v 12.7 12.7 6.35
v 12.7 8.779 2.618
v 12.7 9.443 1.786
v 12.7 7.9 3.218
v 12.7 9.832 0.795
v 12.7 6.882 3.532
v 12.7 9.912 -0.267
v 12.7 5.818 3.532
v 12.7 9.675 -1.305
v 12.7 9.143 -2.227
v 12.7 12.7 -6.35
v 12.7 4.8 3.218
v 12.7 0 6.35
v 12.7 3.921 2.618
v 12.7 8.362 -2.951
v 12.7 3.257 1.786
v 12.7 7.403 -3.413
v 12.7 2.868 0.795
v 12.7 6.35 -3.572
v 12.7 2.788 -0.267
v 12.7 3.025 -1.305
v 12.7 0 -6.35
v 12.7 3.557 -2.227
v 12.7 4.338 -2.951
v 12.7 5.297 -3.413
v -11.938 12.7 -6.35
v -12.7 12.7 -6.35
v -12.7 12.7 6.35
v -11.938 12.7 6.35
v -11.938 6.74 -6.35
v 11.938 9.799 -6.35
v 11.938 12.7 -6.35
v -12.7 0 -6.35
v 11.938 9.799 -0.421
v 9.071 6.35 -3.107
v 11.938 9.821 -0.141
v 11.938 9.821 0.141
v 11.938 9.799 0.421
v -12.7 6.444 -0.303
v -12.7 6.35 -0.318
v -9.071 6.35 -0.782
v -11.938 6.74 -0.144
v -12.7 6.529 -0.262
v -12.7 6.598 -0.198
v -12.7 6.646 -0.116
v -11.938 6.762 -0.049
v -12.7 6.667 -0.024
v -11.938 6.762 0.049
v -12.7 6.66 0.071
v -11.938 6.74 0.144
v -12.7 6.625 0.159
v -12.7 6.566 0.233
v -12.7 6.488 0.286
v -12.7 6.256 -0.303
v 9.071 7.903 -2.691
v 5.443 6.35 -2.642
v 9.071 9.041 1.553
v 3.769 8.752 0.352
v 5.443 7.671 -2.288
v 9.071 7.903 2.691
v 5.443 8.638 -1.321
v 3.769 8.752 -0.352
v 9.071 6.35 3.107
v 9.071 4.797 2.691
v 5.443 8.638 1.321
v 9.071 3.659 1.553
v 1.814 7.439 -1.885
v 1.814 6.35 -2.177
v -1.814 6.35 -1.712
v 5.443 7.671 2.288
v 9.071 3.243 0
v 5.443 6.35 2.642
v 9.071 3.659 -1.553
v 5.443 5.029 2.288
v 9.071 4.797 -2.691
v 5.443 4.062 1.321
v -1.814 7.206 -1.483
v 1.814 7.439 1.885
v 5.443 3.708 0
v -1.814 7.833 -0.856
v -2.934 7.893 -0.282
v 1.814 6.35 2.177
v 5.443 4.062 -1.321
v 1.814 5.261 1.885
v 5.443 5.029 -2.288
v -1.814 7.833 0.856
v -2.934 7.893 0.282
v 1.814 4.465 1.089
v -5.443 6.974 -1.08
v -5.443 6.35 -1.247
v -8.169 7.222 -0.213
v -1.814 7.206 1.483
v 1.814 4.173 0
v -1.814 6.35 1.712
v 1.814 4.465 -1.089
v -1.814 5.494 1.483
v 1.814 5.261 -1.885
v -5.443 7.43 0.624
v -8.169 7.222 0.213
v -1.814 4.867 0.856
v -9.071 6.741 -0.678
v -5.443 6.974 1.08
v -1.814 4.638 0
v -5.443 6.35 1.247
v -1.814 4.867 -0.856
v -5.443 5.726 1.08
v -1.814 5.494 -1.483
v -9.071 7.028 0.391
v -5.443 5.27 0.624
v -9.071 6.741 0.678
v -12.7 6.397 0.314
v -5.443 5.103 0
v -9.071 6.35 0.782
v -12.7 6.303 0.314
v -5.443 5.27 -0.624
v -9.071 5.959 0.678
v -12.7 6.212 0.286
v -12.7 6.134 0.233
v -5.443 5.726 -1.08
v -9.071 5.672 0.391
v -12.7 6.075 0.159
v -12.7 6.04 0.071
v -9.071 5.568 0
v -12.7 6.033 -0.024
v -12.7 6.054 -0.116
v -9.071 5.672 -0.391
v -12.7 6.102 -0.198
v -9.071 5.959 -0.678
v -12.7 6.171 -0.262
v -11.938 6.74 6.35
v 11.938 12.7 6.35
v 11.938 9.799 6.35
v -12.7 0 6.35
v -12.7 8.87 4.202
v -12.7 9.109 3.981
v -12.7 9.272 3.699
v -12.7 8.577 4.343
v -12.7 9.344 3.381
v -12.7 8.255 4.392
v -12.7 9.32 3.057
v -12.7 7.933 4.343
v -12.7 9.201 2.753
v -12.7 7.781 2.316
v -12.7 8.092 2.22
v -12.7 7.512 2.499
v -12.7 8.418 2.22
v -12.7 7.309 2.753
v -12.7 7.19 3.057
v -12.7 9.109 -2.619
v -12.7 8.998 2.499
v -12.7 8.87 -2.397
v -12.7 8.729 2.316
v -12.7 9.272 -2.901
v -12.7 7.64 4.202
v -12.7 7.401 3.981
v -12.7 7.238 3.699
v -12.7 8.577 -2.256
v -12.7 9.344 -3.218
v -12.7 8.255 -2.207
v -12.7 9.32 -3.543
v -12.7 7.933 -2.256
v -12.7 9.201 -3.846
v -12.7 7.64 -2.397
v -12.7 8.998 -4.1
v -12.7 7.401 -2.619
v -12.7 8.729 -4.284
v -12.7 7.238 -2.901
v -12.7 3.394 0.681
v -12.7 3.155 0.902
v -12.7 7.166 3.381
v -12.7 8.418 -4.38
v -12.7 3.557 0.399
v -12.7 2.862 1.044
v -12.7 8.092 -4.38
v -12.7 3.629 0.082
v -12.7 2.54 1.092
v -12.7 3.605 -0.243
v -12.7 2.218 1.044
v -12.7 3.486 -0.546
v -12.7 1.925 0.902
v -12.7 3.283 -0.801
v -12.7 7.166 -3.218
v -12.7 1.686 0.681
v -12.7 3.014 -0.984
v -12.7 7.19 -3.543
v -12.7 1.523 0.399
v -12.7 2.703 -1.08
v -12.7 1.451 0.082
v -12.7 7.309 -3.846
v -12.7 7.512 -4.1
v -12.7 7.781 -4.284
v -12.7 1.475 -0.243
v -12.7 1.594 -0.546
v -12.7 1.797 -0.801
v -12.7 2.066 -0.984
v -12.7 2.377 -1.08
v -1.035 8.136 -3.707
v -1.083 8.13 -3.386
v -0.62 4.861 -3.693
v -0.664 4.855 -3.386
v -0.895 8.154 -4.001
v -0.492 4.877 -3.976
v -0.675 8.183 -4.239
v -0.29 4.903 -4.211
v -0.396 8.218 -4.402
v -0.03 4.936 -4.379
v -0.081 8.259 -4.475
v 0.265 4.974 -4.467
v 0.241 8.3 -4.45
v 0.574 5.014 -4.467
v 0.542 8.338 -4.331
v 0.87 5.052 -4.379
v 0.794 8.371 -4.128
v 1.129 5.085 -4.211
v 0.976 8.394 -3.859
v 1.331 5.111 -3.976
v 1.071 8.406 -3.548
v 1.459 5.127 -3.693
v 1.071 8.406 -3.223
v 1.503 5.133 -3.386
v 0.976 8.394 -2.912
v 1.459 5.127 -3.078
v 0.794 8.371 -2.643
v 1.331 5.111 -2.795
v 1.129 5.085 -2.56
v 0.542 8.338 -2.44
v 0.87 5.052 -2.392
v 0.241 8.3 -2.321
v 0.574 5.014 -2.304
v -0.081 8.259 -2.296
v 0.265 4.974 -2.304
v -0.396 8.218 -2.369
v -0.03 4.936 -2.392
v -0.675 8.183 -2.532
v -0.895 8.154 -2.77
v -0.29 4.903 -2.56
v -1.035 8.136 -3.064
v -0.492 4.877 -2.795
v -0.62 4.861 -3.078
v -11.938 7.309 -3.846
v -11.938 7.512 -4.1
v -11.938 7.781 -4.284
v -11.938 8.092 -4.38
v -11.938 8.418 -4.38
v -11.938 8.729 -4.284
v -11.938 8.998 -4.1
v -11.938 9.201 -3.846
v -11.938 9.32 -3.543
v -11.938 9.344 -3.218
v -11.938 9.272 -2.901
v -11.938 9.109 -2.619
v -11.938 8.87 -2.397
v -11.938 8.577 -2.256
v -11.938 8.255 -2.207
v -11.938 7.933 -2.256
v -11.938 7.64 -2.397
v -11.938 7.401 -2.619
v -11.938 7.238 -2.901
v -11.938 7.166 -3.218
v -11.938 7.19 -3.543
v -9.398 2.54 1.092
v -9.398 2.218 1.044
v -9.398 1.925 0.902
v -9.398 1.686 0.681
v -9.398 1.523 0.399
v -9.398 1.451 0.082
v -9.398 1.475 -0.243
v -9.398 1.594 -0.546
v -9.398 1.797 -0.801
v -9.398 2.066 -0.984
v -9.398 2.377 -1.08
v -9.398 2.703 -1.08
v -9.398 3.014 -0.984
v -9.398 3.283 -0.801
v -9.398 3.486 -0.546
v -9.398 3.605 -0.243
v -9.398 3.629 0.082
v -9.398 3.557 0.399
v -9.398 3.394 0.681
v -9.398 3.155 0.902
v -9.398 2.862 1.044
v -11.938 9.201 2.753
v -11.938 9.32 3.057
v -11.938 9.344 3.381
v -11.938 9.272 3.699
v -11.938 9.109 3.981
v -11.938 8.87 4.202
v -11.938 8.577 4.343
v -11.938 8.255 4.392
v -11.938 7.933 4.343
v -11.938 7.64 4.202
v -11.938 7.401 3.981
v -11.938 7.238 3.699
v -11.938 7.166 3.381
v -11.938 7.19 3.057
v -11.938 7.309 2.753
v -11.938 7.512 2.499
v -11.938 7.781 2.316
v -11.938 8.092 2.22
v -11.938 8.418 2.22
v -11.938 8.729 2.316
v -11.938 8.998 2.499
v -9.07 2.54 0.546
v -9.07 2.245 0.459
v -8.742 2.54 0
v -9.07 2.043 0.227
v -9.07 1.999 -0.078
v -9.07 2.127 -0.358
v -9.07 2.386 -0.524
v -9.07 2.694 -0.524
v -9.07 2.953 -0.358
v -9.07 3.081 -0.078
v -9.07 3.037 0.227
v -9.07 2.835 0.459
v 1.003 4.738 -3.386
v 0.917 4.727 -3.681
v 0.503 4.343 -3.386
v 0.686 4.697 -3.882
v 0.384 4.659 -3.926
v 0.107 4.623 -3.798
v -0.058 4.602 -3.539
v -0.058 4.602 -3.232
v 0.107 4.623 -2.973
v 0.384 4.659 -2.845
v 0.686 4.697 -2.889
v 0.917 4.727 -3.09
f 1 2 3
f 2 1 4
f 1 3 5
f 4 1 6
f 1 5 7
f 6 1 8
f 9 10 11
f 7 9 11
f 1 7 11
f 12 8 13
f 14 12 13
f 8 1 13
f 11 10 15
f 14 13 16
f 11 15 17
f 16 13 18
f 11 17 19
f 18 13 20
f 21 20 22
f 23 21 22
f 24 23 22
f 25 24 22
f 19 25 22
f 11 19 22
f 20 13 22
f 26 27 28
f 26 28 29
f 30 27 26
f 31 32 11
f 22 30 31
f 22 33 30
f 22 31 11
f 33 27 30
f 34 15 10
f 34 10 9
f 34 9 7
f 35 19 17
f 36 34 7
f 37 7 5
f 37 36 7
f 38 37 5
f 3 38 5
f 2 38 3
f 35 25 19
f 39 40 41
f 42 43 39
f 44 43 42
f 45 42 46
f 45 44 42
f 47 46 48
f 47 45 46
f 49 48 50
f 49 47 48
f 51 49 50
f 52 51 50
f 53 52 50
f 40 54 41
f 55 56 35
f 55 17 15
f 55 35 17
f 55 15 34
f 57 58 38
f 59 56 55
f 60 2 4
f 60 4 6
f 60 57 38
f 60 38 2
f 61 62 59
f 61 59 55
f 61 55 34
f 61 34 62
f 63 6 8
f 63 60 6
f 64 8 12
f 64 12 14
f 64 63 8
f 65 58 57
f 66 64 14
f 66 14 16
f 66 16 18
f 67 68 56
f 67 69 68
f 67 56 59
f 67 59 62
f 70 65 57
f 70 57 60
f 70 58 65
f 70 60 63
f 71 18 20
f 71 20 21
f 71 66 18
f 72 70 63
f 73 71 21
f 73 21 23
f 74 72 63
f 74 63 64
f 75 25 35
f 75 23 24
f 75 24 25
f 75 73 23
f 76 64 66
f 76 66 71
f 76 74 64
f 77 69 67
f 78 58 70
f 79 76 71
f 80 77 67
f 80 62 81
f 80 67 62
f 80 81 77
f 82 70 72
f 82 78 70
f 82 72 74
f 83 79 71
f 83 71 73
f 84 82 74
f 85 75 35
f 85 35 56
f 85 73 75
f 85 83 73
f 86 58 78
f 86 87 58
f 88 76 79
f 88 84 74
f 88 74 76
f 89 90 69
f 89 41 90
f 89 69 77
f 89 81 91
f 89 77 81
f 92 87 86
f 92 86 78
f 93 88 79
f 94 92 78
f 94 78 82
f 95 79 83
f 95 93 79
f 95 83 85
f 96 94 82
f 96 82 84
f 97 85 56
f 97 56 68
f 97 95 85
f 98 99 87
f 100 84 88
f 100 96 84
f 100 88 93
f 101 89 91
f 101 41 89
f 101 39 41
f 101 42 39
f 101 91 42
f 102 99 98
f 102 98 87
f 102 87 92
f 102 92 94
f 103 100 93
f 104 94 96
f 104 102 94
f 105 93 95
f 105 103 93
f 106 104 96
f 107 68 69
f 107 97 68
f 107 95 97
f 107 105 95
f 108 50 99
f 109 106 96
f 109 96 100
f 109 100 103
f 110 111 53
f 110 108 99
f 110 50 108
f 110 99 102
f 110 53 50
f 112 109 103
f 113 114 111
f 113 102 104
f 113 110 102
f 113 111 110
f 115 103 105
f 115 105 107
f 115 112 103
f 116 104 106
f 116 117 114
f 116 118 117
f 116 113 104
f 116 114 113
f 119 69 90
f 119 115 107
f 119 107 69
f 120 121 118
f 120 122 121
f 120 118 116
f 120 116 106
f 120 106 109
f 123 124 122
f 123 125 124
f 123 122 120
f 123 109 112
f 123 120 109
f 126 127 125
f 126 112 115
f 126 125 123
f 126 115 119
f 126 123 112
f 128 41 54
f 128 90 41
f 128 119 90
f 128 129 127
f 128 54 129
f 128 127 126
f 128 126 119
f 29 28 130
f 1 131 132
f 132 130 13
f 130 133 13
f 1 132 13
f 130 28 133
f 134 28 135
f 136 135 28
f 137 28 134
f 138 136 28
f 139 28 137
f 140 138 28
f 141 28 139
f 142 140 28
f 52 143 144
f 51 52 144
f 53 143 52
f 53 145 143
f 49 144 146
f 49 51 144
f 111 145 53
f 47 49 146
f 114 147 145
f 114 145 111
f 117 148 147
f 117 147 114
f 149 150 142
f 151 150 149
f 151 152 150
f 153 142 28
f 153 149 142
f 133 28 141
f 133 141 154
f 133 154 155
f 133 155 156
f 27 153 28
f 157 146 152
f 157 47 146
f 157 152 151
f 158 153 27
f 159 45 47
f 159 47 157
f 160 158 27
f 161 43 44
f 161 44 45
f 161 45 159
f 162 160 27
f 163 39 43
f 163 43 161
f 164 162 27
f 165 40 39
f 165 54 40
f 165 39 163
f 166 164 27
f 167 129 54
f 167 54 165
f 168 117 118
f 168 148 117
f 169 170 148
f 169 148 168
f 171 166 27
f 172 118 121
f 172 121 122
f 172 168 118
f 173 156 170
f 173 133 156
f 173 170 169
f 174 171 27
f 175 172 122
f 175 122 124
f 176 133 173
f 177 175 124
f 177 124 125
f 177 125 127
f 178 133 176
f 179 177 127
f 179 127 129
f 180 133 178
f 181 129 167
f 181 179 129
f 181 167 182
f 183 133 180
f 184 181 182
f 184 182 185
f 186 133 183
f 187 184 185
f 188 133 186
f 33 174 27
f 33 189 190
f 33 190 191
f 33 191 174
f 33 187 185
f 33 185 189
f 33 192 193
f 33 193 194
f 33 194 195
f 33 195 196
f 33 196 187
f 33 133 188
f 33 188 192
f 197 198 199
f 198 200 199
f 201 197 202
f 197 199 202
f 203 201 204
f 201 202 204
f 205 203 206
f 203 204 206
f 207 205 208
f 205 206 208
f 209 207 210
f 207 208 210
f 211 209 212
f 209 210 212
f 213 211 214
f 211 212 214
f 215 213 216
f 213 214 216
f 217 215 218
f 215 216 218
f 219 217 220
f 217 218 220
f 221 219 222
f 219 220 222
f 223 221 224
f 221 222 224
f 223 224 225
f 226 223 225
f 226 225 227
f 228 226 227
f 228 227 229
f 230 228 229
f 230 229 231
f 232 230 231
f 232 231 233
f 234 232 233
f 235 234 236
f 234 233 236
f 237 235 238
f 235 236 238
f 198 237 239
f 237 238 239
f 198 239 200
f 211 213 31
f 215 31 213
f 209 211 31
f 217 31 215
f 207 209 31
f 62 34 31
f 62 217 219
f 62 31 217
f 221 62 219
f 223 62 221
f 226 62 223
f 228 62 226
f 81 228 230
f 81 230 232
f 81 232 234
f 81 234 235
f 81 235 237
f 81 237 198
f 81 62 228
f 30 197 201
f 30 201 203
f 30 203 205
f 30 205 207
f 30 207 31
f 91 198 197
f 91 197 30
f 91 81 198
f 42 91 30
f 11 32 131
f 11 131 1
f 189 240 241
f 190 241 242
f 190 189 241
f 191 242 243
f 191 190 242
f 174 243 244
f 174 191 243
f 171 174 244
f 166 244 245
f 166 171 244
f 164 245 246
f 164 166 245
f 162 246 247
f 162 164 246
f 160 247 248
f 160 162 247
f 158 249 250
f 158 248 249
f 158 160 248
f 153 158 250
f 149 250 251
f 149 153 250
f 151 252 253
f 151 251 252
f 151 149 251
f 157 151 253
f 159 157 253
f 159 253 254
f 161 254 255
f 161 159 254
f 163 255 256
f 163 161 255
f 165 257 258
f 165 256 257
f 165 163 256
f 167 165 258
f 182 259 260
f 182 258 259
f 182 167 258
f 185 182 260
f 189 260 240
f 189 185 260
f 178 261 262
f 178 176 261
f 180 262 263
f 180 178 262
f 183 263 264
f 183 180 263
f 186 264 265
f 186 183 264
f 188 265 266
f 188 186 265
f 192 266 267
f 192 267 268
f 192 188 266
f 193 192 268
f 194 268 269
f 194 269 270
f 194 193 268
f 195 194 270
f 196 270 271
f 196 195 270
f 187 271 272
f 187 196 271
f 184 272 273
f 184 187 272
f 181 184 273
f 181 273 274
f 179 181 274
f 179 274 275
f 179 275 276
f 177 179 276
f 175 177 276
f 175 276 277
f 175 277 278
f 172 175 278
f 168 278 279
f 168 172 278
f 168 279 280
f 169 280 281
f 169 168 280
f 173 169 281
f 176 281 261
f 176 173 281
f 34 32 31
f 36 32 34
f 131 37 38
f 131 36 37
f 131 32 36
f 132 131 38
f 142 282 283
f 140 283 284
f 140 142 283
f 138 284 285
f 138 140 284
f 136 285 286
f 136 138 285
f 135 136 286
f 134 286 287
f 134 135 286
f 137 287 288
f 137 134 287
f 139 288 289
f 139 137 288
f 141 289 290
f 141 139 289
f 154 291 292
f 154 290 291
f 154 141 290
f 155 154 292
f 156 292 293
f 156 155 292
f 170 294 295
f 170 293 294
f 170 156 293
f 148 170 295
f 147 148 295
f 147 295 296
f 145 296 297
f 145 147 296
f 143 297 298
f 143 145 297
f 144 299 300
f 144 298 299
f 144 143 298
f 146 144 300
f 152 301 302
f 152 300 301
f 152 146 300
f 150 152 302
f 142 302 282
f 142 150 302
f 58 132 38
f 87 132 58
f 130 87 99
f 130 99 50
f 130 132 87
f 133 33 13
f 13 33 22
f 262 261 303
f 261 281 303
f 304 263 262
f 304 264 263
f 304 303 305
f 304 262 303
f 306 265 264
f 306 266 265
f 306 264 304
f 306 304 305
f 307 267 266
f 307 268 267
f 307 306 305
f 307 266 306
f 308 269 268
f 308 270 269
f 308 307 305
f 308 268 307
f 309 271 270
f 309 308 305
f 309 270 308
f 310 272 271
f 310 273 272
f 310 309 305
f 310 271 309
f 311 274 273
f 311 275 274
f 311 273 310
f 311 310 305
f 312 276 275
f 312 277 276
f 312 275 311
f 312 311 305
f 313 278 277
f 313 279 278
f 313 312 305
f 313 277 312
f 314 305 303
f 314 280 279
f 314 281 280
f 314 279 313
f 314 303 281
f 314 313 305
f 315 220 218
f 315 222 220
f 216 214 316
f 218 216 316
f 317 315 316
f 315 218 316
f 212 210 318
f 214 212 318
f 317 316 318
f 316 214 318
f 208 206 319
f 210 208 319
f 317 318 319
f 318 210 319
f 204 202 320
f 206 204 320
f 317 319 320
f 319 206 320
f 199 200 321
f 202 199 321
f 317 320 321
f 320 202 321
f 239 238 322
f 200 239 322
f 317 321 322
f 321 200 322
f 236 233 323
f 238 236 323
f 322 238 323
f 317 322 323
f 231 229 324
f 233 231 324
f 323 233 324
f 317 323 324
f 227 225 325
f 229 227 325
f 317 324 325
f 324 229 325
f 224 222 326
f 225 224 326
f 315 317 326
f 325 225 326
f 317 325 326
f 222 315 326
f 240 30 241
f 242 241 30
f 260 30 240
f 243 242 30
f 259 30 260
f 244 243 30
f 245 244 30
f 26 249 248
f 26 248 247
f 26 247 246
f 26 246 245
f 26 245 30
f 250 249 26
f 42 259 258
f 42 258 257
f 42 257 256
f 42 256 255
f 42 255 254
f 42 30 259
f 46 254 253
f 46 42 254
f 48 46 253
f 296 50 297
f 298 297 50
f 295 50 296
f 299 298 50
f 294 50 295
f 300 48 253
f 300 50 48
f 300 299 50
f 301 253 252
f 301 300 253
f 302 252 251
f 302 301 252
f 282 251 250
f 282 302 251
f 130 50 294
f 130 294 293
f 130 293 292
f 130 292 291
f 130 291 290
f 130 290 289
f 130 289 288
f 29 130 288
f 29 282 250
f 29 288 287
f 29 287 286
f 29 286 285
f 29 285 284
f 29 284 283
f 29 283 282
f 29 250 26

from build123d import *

# Parameters (mm, degrees)
SKETCH1_W                 = 25.4
SKETCH1_H                 = 12.7
BOSS_EXTRUDE1_DEPTH       = 12.7
SKETCH2_R                 = 3.571875
SKETCH3_R                 = 0.3175
CUT_EXTRUDE2_REACH        = 23.997
F_2_56_TAPPED_HOLE2_D     = 2.1844
F_2_56_TAPPED_HOLE2_DEPTH = 3.302
F_2_56_TAPPED_HOLE2_TIP   = 0.656259968
CIRPATTERN1_COUNT         = 3


with BuildPart() as part:
    # Sketch1 → Boss-Extrude1 (new body)
    with BuildSketch(Plane(origin=(0, 0, 0), x_dir=(1, 0, 0), z_dir=(0, 1, 0))):
        Rectangle(SKETCH1_W, SKETCH1_H)
    extrude(amount=BOSS_EXTRUDE1_DEPTH)

    # Sketch2 → Cut-Loft2 section 0
    with BuildSketch(Plane(origin=(12.7, 0, 0), x_dir=(0, 0, -1), z_dir=(1, 0, 0))):
        with Locations((0, 6.35)):
            Circle(SKETCH2_R)
    # Sketch3 → Cut-Loft2 section 1
    with BuildSketch(Plane.ZY.offset(12.7)):
        with Locations((0, 6.35)):
            Circle(SKETCH3_R)
    loft(mode=Mode.SUBTRACT)

    # Cut-Extrude2: up to this face of the body (flat: up to its plane)
    cut_extrude2_end = Plane(part.part.faces().sort_by_distance((0, 6.35, -6.35))[0])
    # Sketch6 → Cut-Extrude2 (cut, up to the picked face)
    with BuildSketch(Plane.XY.offset(6.35), mode=Mode.PRIVATE) as cut_extrude2_sk1:
        Polygon((-11.938, 12.7), (11.938, 12.7), (11.938, 9.798636115), (-11.938, 6.739523615), align=None)
    cut_extrude2_tool1 = split(extrude(cut_extrude2_sk1.sketch, amount=-CUT_EXTRUDE2_REACH, mode=Mode.PRIVATE), bisect_by=cut_extrude2_end, keep=Keep.BOTH, mode=Mode.PRIVATE)
    add(cut_extrude2_tool1.solids().sort_by(Axis((-1.373668, 10.396539, 6.35), (0, 0, -1)))[0], mode=Mode.SUBTRACT)

    # #2-56 Tapped Hole2
    with Locations(Plane(origin=(-1.042364388, 8.135526928, 0), x_dir=(0.9918916863822601, 0.12708612231772706, 0), z_dir=(-0.12708612231772703, 0.99189168638226, 0))):
        with Locations((1.050885295, 3.385522314)):
            Hole(F_2_56_TAPPED_HOLE2_D / 2, depth=F_2_56_TAPPED_HOLE2_DEPTH)
            with Locations((0, 0, -(F_2_56_TAPPED_HOLE2_DEPTH + F_2_56_TAPPED_HOLE2_TIP / 2))):  # 118° drill point
                Cone(0, F_2_56_TAPPED_HOLE2_D / 2, F_2_56_TAPPED_HOLE2_TIP, mode=Mode.SUBTRACT)

    # Sketch26 → #2-56 Tapped Hole3 (revolve, cut)
    with BuildSketch(Plane(origin=(-12.7, 2.54, 0), x_dir=(0, 0, 1), z_dir=(0, 1, 0))):
        Polygon((0, 0), (0, 3.958259968), (1.0922, 3.302), (1.0922, 0), align=None)
    f_2_56_tapped_hole3 = revolve(axis=Axis((-19.05, 2.54, 0), (1, 0, 0)), mode=Mode.SUBTRACT)

    # CirPattern1: #2-56 Tapped Hole3 ×3 about axis
    cirpattern1_axis = Axis((0, 6.35, 0), (1, 0, 0))
    for i in range(1, CIRPATTERN1_COUNT):
        add(f_2_56_tapped_hole3.rotate(cirpattern1_axis, i * 360 / CIRPATTERN1_COUNT), mode=Mode.SUBTRACT)


solid = part.part
